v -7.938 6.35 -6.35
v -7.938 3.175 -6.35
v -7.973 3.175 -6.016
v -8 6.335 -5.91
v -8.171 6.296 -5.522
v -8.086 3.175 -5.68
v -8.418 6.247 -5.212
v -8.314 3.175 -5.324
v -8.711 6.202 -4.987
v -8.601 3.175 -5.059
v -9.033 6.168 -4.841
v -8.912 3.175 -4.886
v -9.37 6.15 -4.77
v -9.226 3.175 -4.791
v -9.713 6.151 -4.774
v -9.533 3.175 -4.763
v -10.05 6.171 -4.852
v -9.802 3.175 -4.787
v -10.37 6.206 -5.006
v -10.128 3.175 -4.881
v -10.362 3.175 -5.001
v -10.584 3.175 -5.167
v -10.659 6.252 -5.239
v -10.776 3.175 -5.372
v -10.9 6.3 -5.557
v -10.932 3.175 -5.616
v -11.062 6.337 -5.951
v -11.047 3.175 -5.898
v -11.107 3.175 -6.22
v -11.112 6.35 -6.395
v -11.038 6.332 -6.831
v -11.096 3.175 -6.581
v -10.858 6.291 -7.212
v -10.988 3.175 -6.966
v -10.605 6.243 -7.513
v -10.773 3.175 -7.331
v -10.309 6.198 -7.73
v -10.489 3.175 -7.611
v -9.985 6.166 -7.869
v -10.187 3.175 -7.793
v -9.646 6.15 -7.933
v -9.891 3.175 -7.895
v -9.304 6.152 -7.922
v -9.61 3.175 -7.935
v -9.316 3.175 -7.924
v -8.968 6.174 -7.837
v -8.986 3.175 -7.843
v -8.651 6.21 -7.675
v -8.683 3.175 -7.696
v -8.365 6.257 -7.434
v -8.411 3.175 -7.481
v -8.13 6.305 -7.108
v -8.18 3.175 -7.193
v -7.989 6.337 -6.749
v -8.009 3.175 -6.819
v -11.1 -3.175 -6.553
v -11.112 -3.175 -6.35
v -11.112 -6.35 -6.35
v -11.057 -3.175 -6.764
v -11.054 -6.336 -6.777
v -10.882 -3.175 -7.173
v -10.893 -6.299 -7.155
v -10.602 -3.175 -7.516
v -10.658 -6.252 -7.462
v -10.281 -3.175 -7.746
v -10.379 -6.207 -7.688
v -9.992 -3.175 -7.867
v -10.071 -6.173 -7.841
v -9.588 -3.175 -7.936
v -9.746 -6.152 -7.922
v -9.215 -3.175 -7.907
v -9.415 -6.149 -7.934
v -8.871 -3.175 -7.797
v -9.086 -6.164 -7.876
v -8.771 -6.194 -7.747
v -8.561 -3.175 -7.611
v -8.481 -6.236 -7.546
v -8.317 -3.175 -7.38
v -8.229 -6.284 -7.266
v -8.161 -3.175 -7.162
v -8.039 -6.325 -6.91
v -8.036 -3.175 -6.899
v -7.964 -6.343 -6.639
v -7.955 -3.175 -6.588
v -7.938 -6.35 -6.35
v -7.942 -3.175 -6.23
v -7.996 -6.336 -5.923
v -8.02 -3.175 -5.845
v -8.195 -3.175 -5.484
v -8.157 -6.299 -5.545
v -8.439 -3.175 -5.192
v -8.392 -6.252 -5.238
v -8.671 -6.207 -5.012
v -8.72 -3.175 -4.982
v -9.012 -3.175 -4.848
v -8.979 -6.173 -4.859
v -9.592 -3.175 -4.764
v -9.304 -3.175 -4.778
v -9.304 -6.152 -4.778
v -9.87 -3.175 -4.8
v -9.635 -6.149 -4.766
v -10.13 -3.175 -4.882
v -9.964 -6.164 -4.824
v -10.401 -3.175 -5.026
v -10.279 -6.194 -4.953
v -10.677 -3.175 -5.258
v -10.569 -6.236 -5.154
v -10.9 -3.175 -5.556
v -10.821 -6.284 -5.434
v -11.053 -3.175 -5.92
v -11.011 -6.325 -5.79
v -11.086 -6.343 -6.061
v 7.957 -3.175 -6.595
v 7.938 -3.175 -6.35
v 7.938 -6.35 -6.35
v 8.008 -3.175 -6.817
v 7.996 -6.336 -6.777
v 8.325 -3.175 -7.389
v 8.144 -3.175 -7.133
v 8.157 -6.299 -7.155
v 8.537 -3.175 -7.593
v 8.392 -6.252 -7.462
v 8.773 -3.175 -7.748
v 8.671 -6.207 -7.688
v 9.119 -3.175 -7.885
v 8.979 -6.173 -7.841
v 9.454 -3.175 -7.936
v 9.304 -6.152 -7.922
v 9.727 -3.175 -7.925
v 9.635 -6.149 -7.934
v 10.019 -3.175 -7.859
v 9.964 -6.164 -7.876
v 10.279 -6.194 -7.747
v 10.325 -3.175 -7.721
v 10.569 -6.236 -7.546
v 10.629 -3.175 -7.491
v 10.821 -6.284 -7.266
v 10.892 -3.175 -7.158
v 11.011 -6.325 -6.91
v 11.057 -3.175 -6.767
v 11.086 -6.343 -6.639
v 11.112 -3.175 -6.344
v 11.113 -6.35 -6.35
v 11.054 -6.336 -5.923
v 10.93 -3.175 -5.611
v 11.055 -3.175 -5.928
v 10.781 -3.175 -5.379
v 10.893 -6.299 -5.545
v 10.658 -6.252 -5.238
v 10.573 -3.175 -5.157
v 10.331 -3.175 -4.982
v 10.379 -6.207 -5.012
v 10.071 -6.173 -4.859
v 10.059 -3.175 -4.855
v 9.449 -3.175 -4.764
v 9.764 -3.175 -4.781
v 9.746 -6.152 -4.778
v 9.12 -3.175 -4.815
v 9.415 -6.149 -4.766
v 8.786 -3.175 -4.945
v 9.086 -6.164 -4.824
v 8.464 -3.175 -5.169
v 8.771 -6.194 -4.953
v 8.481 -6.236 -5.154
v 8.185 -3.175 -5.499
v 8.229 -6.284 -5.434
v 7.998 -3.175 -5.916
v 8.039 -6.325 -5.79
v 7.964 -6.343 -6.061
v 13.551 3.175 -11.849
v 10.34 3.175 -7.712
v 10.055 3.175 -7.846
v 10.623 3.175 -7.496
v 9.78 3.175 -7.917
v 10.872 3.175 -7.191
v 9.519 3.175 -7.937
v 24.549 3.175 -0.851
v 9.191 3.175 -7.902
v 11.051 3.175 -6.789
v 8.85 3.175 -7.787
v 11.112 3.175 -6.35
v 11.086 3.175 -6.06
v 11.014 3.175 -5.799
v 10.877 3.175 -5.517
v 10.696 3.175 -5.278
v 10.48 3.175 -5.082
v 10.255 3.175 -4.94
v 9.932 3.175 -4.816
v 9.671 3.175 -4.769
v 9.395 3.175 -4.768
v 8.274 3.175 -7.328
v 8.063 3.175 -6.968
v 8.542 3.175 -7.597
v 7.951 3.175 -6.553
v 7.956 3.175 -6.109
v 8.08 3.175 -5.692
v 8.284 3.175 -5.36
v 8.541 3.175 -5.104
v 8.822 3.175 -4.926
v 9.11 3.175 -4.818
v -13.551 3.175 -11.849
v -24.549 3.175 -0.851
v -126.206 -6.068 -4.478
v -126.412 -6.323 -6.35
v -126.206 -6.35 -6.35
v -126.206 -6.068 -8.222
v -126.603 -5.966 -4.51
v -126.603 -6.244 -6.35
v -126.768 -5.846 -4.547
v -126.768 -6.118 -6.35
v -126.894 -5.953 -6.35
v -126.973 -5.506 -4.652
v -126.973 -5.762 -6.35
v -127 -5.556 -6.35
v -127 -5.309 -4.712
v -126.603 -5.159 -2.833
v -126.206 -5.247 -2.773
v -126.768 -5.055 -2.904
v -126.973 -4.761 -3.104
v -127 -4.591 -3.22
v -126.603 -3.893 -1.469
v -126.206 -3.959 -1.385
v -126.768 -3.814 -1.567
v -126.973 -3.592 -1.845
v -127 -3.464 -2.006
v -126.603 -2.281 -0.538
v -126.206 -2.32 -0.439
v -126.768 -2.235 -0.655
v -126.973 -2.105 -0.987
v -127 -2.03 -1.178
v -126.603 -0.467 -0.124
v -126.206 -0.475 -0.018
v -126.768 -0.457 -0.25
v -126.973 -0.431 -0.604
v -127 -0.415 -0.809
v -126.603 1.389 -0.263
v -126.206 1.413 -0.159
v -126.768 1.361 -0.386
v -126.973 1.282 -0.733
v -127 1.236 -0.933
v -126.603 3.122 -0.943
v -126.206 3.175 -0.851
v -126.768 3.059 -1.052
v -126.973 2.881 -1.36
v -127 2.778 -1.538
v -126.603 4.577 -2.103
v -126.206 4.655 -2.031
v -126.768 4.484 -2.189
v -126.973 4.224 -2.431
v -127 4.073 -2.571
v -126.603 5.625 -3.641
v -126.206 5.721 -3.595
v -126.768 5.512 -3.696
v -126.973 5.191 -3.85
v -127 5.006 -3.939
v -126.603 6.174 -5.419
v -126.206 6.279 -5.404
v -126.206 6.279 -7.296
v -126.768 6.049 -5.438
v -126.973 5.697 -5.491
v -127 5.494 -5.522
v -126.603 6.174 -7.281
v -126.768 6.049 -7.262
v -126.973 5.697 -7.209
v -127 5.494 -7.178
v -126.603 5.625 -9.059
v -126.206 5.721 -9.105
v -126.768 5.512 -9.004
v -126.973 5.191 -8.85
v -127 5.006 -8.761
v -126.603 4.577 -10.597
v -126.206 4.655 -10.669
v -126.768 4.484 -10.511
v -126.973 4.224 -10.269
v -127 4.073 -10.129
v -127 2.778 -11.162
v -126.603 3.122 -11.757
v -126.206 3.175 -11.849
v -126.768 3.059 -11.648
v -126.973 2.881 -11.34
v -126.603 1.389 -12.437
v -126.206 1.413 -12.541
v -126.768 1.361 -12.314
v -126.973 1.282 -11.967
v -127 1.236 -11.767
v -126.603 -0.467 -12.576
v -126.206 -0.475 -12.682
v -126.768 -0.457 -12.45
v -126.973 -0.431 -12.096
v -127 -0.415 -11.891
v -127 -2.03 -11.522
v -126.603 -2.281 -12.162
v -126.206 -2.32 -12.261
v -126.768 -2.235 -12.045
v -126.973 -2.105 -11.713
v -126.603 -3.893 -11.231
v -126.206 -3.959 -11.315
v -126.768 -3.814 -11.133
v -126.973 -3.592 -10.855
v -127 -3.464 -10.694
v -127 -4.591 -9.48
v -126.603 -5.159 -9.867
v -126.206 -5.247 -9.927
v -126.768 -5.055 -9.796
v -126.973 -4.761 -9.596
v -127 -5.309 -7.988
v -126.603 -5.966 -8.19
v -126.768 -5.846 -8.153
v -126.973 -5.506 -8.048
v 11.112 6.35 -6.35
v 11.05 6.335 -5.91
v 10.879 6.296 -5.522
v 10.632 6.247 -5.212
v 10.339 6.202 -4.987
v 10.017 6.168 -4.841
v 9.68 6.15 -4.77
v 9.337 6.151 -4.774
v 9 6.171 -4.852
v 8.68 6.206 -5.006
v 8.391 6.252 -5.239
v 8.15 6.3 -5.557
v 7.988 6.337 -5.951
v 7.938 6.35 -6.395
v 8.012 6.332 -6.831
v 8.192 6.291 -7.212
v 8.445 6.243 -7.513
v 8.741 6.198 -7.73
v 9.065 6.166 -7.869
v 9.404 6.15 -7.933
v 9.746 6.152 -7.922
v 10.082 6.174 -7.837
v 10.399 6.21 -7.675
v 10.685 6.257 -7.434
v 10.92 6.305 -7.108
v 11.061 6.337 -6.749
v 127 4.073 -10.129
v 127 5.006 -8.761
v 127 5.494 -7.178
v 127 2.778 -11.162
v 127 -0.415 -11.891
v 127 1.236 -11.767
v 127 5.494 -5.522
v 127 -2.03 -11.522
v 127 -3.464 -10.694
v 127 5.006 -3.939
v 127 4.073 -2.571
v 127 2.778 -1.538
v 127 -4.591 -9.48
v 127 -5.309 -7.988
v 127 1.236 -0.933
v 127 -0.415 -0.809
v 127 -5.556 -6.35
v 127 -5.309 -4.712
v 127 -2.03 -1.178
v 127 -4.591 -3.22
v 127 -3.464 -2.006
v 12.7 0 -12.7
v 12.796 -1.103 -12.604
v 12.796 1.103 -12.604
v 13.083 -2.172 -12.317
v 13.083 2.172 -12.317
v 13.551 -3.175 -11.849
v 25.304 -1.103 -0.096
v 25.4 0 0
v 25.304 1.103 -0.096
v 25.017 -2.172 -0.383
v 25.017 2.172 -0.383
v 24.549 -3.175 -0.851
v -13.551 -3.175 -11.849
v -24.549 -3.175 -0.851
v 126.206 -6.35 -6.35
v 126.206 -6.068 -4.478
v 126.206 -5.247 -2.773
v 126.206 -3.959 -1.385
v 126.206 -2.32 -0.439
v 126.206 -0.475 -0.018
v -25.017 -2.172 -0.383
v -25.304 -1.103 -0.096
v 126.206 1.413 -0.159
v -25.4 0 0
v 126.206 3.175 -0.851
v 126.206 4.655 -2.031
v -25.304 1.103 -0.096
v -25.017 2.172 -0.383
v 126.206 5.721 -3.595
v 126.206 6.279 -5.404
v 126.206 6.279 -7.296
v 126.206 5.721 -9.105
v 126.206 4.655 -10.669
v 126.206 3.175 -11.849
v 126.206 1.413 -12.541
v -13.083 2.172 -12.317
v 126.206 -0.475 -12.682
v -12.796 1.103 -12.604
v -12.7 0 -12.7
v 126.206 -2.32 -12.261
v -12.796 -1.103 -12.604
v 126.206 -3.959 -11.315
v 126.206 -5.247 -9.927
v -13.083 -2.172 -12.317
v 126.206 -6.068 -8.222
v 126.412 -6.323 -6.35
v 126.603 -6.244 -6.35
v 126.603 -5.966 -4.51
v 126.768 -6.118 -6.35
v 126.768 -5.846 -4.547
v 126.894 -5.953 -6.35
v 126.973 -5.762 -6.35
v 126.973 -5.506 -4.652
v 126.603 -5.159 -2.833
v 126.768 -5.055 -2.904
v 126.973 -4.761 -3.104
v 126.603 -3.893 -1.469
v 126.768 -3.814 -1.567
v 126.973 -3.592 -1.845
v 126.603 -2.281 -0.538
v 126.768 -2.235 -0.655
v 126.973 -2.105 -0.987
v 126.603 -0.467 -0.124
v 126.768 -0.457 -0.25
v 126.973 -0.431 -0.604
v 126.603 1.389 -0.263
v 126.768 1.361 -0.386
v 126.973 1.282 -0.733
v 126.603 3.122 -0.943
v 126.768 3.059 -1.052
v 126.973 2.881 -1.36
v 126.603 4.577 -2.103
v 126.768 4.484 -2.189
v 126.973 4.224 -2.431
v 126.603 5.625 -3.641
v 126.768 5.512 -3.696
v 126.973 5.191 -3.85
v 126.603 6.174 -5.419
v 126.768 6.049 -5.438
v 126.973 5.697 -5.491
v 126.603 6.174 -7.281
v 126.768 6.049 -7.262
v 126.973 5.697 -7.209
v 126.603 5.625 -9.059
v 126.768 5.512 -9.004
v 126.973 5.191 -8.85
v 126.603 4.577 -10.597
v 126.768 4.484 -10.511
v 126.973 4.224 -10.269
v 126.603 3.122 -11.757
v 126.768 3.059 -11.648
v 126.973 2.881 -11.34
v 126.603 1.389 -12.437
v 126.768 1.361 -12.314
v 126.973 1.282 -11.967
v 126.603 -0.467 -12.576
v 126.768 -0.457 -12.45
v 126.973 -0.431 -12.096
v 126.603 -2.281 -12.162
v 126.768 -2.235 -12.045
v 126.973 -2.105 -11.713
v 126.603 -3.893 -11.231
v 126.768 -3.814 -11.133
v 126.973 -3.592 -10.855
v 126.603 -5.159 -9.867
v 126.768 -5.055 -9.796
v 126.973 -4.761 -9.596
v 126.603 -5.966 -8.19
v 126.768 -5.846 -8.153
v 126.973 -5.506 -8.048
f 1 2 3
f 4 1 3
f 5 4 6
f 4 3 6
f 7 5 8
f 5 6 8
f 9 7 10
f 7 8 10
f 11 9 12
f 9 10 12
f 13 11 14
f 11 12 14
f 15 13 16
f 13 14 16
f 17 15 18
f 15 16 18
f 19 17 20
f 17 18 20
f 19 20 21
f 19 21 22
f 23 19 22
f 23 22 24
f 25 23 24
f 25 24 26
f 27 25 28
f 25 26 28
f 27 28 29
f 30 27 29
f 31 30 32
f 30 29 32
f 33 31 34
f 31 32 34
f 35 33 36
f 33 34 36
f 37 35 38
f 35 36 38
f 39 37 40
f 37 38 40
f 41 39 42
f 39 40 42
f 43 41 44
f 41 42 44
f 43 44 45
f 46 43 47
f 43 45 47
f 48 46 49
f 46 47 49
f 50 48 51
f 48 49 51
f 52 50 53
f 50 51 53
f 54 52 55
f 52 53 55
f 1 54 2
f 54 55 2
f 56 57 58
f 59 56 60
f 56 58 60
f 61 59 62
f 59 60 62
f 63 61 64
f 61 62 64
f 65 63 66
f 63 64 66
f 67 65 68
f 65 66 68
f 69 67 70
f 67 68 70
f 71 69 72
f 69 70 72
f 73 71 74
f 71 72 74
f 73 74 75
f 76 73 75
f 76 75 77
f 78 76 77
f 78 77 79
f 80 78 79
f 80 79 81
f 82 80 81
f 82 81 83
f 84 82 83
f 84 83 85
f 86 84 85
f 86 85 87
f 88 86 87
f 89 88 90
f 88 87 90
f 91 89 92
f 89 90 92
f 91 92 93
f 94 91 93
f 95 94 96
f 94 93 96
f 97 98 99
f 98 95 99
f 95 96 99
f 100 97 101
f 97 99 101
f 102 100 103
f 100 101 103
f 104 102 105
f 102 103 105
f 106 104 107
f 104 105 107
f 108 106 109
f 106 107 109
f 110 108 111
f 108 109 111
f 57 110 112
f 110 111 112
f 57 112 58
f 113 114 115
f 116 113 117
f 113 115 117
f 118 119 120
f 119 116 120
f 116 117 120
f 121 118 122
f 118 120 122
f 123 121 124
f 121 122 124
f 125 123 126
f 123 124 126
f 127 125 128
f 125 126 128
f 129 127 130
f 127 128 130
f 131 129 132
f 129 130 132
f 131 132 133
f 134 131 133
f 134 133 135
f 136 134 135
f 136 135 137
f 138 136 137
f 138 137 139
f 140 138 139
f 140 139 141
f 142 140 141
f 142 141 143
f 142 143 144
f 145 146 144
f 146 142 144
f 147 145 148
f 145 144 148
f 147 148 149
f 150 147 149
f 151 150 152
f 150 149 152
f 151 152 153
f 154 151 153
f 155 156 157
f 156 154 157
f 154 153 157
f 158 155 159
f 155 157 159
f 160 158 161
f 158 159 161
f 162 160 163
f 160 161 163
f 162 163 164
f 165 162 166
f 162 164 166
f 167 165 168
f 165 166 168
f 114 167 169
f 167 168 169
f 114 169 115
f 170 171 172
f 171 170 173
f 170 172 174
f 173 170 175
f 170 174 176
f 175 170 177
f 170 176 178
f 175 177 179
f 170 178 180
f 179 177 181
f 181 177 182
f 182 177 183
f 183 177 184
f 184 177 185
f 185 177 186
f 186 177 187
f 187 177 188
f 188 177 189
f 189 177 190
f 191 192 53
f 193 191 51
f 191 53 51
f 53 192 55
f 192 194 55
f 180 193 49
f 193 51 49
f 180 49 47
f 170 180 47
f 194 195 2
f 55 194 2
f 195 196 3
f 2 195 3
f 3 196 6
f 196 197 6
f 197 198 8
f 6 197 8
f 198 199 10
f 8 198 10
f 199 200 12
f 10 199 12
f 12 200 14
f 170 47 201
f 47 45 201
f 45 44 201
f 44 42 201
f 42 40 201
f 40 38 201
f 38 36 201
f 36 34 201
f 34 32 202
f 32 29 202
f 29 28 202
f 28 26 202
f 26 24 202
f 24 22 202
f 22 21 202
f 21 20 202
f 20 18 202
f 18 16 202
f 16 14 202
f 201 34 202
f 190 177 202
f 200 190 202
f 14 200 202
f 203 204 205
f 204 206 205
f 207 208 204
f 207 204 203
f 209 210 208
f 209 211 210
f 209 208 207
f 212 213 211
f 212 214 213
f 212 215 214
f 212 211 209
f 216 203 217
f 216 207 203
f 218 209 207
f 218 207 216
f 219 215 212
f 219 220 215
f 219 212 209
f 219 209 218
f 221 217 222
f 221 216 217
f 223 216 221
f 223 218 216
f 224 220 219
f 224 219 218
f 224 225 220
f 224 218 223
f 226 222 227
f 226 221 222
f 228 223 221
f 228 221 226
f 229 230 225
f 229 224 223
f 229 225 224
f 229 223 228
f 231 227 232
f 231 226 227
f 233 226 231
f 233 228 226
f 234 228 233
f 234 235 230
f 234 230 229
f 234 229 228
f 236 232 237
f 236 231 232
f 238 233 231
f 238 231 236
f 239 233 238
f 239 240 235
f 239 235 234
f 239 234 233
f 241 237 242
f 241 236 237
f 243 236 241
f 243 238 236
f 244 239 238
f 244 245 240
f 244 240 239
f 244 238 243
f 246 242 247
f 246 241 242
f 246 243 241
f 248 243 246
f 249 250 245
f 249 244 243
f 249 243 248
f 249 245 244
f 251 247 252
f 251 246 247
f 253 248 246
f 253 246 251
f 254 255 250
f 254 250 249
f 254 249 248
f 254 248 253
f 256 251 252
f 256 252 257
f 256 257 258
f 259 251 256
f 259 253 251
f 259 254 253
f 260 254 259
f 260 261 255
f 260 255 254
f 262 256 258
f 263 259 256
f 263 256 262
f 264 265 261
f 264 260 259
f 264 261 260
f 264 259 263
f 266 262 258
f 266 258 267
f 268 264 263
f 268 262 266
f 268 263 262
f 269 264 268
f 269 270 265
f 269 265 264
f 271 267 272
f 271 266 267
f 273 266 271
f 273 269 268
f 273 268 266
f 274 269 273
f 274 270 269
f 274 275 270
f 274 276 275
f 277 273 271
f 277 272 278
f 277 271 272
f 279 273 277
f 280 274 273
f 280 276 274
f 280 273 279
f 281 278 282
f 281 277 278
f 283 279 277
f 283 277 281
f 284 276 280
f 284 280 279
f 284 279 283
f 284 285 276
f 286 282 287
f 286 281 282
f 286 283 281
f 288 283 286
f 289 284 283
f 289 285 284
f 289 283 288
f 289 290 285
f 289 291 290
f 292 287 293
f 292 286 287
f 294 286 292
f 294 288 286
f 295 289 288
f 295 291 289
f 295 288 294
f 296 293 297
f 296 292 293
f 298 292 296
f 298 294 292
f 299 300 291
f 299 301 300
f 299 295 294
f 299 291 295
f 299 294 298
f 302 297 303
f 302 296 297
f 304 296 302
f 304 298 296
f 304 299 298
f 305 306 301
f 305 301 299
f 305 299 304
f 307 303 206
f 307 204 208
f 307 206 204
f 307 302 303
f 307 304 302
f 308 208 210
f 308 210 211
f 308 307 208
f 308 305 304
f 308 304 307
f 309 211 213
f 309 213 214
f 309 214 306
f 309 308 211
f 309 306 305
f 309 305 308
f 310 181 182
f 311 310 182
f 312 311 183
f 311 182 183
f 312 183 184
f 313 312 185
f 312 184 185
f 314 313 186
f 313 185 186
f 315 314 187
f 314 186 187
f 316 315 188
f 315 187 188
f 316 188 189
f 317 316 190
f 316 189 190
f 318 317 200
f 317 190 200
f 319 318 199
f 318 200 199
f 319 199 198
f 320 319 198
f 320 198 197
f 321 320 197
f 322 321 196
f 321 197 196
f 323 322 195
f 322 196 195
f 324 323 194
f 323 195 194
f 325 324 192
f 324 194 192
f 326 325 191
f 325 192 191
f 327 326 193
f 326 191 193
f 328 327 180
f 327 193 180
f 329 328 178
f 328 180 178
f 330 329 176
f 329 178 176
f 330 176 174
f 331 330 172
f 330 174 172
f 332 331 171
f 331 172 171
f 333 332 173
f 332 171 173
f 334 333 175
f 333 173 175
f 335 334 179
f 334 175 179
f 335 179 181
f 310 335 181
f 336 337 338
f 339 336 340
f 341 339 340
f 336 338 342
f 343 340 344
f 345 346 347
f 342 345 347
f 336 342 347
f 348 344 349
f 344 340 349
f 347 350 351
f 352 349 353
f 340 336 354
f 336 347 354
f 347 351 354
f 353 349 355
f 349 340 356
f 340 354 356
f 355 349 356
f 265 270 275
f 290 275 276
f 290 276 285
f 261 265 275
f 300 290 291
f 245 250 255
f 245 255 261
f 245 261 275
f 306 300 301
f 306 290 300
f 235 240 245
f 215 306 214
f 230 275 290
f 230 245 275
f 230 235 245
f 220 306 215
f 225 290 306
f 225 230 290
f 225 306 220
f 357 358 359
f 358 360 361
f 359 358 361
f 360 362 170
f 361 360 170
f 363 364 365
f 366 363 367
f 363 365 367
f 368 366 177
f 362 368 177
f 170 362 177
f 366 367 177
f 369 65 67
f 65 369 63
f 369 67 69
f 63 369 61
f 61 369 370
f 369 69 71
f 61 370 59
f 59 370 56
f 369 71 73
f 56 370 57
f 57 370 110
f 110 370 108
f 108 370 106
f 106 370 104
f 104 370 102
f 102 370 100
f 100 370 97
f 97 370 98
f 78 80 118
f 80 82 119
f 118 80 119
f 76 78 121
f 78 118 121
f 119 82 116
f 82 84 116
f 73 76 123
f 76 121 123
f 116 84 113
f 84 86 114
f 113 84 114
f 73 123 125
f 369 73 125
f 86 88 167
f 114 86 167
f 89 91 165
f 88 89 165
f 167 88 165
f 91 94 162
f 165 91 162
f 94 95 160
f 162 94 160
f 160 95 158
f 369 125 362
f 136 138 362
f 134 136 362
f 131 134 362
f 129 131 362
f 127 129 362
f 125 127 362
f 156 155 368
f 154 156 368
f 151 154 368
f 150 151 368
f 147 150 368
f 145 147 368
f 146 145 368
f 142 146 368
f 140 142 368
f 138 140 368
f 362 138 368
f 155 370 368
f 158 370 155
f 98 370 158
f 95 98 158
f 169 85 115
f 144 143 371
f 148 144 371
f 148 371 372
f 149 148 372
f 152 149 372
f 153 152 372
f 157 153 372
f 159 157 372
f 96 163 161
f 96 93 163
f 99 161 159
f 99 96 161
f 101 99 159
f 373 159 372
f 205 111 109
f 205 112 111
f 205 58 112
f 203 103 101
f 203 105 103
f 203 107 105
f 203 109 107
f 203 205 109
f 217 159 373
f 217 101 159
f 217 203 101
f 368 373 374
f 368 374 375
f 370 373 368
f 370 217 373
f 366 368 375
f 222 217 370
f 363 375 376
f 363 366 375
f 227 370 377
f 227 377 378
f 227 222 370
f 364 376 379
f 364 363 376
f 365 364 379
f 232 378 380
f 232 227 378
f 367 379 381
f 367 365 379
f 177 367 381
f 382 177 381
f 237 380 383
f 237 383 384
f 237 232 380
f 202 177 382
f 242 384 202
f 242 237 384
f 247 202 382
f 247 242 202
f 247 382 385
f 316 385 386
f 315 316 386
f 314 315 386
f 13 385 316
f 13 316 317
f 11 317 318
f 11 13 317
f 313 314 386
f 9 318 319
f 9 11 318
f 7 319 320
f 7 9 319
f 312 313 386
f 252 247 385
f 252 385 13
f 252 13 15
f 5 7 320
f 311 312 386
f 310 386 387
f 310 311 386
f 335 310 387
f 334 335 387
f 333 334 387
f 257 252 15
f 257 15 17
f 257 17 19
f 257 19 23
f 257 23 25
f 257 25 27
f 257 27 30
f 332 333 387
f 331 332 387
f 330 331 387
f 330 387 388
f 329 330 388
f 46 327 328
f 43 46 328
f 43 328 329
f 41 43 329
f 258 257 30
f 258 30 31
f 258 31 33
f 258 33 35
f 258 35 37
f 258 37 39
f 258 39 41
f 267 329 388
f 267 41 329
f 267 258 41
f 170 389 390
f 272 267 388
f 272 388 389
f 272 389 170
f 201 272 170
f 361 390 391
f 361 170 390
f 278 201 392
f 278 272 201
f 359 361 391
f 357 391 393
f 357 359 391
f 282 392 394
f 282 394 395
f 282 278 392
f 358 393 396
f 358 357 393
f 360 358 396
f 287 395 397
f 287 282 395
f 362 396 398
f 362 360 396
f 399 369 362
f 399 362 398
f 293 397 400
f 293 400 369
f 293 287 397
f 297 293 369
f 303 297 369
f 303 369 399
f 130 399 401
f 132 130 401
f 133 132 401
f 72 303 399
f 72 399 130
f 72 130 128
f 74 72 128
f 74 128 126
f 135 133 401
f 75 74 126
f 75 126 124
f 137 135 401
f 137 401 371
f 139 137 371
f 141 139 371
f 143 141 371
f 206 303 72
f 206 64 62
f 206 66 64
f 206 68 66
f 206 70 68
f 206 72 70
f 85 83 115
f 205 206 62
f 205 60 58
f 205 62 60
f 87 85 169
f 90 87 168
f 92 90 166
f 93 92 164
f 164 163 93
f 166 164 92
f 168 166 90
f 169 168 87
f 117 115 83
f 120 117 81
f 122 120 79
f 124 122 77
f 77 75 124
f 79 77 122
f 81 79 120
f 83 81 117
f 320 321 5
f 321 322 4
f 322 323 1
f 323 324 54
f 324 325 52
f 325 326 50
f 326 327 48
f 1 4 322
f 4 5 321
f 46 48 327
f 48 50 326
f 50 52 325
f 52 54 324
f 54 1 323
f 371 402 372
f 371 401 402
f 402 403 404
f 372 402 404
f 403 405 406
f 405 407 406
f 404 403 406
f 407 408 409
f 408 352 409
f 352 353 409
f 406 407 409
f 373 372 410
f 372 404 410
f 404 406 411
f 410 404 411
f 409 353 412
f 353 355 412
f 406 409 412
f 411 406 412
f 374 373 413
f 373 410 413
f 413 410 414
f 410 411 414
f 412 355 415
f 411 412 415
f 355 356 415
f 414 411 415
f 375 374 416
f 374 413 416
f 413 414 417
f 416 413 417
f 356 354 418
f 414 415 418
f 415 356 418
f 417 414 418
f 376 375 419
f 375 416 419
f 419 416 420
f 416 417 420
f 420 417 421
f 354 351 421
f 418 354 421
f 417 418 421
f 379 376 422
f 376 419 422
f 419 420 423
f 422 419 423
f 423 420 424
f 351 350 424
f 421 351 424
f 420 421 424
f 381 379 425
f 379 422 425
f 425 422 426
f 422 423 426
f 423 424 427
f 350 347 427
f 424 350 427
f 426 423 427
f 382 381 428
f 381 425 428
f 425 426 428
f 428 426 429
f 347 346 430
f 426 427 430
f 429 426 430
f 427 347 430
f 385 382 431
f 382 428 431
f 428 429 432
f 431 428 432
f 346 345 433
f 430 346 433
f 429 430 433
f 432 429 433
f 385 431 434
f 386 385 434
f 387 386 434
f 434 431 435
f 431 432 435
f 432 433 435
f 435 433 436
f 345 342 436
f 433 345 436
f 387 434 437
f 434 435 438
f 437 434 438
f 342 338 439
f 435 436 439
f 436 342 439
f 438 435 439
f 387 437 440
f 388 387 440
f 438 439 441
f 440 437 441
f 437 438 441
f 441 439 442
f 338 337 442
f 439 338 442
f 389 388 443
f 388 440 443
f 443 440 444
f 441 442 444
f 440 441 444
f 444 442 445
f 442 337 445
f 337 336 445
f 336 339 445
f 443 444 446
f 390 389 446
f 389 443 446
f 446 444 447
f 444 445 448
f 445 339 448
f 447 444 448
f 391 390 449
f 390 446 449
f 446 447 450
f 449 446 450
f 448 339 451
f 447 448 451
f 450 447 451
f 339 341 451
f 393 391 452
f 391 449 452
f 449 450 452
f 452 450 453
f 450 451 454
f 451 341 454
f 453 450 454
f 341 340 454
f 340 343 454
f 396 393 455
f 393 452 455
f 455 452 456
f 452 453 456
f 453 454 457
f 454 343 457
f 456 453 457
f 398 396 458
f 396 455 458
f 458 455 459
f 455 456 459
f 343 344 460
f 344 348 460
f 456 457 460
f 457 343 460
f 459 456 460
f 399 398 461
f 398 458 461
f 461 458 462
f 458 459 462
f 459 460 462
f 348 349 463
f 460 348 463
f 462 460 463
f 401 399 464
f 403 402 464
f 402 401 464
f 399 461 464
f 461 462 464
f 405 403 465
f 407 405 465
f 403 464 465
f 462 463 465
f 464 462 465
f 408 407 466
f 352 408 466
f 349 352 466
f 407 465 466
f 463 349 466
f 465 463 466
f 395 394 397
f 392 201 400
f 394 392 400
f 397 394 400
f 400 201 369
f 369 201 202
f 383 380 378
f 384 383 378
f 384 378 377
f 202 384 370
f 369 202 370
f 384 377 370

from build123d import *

# Parameters (mm, degrees)
F7_R      = 6.35
F8_DEPTH  = 254
F10_W     = 25.4
F10_H     = 6.35
F9_W      = 50.8
F9_H      = 6.35
F11_D     = 3.175
F11_DEPTH = 6.3510001
F5_D      = 3.175
F6_R      = 0.79375


with BuildPart() as f8:
    # F7 (on line) → F8 (new body)
    with BuildSketch(Plane(origin=(-127, 0, 0), x_dir=(0, -1, 0), z_dir=(-1, 0, 0))):
        with Locations((0, -6.35)):
            Circle(F7_R)
    extrude(amount=-F8_DEPTH)

    # F10 (on line) → F4 section 0
    with BuildSketch(Plane.XY.offset(-12.7)):
        Rectangle(F10_W, F10_H)
    # F9 (on line) → F4 section 1
    with BuildSketch(Plane.XY):
        Rectangle(F9_W, F9_H)
    loft(mode=Mode.SUBTRACT)

    # F11 (through all, one way)
    with BuildSketch(Plane.XZ):
        with Locations((-9.525, -6.35), (9.525, -6.35)):
            Circle(F11_D / 2)
    extrude(amount=-F11_DEPTH, mode=Mode.SUBTRACT)

    # F5 (through all)
    with Locations(Plane(origin=(0, 0, 0), x_dir=(1, 0, 0), z_dir=(0, 1, 0))):
        with Locations((-9.525, 6.35), (9.525, 6.35)):
            Hole(F5_D / 2)

    # F6
    f6_edges = [f8.edges().sort_by_distance(p)[0] for p in [
        (127, 6.35, -6.35),
        (-127, 6.35, -6.35),
    ]]
    fillet(f6_edges, radius=F6_R)


solid = f8.part
